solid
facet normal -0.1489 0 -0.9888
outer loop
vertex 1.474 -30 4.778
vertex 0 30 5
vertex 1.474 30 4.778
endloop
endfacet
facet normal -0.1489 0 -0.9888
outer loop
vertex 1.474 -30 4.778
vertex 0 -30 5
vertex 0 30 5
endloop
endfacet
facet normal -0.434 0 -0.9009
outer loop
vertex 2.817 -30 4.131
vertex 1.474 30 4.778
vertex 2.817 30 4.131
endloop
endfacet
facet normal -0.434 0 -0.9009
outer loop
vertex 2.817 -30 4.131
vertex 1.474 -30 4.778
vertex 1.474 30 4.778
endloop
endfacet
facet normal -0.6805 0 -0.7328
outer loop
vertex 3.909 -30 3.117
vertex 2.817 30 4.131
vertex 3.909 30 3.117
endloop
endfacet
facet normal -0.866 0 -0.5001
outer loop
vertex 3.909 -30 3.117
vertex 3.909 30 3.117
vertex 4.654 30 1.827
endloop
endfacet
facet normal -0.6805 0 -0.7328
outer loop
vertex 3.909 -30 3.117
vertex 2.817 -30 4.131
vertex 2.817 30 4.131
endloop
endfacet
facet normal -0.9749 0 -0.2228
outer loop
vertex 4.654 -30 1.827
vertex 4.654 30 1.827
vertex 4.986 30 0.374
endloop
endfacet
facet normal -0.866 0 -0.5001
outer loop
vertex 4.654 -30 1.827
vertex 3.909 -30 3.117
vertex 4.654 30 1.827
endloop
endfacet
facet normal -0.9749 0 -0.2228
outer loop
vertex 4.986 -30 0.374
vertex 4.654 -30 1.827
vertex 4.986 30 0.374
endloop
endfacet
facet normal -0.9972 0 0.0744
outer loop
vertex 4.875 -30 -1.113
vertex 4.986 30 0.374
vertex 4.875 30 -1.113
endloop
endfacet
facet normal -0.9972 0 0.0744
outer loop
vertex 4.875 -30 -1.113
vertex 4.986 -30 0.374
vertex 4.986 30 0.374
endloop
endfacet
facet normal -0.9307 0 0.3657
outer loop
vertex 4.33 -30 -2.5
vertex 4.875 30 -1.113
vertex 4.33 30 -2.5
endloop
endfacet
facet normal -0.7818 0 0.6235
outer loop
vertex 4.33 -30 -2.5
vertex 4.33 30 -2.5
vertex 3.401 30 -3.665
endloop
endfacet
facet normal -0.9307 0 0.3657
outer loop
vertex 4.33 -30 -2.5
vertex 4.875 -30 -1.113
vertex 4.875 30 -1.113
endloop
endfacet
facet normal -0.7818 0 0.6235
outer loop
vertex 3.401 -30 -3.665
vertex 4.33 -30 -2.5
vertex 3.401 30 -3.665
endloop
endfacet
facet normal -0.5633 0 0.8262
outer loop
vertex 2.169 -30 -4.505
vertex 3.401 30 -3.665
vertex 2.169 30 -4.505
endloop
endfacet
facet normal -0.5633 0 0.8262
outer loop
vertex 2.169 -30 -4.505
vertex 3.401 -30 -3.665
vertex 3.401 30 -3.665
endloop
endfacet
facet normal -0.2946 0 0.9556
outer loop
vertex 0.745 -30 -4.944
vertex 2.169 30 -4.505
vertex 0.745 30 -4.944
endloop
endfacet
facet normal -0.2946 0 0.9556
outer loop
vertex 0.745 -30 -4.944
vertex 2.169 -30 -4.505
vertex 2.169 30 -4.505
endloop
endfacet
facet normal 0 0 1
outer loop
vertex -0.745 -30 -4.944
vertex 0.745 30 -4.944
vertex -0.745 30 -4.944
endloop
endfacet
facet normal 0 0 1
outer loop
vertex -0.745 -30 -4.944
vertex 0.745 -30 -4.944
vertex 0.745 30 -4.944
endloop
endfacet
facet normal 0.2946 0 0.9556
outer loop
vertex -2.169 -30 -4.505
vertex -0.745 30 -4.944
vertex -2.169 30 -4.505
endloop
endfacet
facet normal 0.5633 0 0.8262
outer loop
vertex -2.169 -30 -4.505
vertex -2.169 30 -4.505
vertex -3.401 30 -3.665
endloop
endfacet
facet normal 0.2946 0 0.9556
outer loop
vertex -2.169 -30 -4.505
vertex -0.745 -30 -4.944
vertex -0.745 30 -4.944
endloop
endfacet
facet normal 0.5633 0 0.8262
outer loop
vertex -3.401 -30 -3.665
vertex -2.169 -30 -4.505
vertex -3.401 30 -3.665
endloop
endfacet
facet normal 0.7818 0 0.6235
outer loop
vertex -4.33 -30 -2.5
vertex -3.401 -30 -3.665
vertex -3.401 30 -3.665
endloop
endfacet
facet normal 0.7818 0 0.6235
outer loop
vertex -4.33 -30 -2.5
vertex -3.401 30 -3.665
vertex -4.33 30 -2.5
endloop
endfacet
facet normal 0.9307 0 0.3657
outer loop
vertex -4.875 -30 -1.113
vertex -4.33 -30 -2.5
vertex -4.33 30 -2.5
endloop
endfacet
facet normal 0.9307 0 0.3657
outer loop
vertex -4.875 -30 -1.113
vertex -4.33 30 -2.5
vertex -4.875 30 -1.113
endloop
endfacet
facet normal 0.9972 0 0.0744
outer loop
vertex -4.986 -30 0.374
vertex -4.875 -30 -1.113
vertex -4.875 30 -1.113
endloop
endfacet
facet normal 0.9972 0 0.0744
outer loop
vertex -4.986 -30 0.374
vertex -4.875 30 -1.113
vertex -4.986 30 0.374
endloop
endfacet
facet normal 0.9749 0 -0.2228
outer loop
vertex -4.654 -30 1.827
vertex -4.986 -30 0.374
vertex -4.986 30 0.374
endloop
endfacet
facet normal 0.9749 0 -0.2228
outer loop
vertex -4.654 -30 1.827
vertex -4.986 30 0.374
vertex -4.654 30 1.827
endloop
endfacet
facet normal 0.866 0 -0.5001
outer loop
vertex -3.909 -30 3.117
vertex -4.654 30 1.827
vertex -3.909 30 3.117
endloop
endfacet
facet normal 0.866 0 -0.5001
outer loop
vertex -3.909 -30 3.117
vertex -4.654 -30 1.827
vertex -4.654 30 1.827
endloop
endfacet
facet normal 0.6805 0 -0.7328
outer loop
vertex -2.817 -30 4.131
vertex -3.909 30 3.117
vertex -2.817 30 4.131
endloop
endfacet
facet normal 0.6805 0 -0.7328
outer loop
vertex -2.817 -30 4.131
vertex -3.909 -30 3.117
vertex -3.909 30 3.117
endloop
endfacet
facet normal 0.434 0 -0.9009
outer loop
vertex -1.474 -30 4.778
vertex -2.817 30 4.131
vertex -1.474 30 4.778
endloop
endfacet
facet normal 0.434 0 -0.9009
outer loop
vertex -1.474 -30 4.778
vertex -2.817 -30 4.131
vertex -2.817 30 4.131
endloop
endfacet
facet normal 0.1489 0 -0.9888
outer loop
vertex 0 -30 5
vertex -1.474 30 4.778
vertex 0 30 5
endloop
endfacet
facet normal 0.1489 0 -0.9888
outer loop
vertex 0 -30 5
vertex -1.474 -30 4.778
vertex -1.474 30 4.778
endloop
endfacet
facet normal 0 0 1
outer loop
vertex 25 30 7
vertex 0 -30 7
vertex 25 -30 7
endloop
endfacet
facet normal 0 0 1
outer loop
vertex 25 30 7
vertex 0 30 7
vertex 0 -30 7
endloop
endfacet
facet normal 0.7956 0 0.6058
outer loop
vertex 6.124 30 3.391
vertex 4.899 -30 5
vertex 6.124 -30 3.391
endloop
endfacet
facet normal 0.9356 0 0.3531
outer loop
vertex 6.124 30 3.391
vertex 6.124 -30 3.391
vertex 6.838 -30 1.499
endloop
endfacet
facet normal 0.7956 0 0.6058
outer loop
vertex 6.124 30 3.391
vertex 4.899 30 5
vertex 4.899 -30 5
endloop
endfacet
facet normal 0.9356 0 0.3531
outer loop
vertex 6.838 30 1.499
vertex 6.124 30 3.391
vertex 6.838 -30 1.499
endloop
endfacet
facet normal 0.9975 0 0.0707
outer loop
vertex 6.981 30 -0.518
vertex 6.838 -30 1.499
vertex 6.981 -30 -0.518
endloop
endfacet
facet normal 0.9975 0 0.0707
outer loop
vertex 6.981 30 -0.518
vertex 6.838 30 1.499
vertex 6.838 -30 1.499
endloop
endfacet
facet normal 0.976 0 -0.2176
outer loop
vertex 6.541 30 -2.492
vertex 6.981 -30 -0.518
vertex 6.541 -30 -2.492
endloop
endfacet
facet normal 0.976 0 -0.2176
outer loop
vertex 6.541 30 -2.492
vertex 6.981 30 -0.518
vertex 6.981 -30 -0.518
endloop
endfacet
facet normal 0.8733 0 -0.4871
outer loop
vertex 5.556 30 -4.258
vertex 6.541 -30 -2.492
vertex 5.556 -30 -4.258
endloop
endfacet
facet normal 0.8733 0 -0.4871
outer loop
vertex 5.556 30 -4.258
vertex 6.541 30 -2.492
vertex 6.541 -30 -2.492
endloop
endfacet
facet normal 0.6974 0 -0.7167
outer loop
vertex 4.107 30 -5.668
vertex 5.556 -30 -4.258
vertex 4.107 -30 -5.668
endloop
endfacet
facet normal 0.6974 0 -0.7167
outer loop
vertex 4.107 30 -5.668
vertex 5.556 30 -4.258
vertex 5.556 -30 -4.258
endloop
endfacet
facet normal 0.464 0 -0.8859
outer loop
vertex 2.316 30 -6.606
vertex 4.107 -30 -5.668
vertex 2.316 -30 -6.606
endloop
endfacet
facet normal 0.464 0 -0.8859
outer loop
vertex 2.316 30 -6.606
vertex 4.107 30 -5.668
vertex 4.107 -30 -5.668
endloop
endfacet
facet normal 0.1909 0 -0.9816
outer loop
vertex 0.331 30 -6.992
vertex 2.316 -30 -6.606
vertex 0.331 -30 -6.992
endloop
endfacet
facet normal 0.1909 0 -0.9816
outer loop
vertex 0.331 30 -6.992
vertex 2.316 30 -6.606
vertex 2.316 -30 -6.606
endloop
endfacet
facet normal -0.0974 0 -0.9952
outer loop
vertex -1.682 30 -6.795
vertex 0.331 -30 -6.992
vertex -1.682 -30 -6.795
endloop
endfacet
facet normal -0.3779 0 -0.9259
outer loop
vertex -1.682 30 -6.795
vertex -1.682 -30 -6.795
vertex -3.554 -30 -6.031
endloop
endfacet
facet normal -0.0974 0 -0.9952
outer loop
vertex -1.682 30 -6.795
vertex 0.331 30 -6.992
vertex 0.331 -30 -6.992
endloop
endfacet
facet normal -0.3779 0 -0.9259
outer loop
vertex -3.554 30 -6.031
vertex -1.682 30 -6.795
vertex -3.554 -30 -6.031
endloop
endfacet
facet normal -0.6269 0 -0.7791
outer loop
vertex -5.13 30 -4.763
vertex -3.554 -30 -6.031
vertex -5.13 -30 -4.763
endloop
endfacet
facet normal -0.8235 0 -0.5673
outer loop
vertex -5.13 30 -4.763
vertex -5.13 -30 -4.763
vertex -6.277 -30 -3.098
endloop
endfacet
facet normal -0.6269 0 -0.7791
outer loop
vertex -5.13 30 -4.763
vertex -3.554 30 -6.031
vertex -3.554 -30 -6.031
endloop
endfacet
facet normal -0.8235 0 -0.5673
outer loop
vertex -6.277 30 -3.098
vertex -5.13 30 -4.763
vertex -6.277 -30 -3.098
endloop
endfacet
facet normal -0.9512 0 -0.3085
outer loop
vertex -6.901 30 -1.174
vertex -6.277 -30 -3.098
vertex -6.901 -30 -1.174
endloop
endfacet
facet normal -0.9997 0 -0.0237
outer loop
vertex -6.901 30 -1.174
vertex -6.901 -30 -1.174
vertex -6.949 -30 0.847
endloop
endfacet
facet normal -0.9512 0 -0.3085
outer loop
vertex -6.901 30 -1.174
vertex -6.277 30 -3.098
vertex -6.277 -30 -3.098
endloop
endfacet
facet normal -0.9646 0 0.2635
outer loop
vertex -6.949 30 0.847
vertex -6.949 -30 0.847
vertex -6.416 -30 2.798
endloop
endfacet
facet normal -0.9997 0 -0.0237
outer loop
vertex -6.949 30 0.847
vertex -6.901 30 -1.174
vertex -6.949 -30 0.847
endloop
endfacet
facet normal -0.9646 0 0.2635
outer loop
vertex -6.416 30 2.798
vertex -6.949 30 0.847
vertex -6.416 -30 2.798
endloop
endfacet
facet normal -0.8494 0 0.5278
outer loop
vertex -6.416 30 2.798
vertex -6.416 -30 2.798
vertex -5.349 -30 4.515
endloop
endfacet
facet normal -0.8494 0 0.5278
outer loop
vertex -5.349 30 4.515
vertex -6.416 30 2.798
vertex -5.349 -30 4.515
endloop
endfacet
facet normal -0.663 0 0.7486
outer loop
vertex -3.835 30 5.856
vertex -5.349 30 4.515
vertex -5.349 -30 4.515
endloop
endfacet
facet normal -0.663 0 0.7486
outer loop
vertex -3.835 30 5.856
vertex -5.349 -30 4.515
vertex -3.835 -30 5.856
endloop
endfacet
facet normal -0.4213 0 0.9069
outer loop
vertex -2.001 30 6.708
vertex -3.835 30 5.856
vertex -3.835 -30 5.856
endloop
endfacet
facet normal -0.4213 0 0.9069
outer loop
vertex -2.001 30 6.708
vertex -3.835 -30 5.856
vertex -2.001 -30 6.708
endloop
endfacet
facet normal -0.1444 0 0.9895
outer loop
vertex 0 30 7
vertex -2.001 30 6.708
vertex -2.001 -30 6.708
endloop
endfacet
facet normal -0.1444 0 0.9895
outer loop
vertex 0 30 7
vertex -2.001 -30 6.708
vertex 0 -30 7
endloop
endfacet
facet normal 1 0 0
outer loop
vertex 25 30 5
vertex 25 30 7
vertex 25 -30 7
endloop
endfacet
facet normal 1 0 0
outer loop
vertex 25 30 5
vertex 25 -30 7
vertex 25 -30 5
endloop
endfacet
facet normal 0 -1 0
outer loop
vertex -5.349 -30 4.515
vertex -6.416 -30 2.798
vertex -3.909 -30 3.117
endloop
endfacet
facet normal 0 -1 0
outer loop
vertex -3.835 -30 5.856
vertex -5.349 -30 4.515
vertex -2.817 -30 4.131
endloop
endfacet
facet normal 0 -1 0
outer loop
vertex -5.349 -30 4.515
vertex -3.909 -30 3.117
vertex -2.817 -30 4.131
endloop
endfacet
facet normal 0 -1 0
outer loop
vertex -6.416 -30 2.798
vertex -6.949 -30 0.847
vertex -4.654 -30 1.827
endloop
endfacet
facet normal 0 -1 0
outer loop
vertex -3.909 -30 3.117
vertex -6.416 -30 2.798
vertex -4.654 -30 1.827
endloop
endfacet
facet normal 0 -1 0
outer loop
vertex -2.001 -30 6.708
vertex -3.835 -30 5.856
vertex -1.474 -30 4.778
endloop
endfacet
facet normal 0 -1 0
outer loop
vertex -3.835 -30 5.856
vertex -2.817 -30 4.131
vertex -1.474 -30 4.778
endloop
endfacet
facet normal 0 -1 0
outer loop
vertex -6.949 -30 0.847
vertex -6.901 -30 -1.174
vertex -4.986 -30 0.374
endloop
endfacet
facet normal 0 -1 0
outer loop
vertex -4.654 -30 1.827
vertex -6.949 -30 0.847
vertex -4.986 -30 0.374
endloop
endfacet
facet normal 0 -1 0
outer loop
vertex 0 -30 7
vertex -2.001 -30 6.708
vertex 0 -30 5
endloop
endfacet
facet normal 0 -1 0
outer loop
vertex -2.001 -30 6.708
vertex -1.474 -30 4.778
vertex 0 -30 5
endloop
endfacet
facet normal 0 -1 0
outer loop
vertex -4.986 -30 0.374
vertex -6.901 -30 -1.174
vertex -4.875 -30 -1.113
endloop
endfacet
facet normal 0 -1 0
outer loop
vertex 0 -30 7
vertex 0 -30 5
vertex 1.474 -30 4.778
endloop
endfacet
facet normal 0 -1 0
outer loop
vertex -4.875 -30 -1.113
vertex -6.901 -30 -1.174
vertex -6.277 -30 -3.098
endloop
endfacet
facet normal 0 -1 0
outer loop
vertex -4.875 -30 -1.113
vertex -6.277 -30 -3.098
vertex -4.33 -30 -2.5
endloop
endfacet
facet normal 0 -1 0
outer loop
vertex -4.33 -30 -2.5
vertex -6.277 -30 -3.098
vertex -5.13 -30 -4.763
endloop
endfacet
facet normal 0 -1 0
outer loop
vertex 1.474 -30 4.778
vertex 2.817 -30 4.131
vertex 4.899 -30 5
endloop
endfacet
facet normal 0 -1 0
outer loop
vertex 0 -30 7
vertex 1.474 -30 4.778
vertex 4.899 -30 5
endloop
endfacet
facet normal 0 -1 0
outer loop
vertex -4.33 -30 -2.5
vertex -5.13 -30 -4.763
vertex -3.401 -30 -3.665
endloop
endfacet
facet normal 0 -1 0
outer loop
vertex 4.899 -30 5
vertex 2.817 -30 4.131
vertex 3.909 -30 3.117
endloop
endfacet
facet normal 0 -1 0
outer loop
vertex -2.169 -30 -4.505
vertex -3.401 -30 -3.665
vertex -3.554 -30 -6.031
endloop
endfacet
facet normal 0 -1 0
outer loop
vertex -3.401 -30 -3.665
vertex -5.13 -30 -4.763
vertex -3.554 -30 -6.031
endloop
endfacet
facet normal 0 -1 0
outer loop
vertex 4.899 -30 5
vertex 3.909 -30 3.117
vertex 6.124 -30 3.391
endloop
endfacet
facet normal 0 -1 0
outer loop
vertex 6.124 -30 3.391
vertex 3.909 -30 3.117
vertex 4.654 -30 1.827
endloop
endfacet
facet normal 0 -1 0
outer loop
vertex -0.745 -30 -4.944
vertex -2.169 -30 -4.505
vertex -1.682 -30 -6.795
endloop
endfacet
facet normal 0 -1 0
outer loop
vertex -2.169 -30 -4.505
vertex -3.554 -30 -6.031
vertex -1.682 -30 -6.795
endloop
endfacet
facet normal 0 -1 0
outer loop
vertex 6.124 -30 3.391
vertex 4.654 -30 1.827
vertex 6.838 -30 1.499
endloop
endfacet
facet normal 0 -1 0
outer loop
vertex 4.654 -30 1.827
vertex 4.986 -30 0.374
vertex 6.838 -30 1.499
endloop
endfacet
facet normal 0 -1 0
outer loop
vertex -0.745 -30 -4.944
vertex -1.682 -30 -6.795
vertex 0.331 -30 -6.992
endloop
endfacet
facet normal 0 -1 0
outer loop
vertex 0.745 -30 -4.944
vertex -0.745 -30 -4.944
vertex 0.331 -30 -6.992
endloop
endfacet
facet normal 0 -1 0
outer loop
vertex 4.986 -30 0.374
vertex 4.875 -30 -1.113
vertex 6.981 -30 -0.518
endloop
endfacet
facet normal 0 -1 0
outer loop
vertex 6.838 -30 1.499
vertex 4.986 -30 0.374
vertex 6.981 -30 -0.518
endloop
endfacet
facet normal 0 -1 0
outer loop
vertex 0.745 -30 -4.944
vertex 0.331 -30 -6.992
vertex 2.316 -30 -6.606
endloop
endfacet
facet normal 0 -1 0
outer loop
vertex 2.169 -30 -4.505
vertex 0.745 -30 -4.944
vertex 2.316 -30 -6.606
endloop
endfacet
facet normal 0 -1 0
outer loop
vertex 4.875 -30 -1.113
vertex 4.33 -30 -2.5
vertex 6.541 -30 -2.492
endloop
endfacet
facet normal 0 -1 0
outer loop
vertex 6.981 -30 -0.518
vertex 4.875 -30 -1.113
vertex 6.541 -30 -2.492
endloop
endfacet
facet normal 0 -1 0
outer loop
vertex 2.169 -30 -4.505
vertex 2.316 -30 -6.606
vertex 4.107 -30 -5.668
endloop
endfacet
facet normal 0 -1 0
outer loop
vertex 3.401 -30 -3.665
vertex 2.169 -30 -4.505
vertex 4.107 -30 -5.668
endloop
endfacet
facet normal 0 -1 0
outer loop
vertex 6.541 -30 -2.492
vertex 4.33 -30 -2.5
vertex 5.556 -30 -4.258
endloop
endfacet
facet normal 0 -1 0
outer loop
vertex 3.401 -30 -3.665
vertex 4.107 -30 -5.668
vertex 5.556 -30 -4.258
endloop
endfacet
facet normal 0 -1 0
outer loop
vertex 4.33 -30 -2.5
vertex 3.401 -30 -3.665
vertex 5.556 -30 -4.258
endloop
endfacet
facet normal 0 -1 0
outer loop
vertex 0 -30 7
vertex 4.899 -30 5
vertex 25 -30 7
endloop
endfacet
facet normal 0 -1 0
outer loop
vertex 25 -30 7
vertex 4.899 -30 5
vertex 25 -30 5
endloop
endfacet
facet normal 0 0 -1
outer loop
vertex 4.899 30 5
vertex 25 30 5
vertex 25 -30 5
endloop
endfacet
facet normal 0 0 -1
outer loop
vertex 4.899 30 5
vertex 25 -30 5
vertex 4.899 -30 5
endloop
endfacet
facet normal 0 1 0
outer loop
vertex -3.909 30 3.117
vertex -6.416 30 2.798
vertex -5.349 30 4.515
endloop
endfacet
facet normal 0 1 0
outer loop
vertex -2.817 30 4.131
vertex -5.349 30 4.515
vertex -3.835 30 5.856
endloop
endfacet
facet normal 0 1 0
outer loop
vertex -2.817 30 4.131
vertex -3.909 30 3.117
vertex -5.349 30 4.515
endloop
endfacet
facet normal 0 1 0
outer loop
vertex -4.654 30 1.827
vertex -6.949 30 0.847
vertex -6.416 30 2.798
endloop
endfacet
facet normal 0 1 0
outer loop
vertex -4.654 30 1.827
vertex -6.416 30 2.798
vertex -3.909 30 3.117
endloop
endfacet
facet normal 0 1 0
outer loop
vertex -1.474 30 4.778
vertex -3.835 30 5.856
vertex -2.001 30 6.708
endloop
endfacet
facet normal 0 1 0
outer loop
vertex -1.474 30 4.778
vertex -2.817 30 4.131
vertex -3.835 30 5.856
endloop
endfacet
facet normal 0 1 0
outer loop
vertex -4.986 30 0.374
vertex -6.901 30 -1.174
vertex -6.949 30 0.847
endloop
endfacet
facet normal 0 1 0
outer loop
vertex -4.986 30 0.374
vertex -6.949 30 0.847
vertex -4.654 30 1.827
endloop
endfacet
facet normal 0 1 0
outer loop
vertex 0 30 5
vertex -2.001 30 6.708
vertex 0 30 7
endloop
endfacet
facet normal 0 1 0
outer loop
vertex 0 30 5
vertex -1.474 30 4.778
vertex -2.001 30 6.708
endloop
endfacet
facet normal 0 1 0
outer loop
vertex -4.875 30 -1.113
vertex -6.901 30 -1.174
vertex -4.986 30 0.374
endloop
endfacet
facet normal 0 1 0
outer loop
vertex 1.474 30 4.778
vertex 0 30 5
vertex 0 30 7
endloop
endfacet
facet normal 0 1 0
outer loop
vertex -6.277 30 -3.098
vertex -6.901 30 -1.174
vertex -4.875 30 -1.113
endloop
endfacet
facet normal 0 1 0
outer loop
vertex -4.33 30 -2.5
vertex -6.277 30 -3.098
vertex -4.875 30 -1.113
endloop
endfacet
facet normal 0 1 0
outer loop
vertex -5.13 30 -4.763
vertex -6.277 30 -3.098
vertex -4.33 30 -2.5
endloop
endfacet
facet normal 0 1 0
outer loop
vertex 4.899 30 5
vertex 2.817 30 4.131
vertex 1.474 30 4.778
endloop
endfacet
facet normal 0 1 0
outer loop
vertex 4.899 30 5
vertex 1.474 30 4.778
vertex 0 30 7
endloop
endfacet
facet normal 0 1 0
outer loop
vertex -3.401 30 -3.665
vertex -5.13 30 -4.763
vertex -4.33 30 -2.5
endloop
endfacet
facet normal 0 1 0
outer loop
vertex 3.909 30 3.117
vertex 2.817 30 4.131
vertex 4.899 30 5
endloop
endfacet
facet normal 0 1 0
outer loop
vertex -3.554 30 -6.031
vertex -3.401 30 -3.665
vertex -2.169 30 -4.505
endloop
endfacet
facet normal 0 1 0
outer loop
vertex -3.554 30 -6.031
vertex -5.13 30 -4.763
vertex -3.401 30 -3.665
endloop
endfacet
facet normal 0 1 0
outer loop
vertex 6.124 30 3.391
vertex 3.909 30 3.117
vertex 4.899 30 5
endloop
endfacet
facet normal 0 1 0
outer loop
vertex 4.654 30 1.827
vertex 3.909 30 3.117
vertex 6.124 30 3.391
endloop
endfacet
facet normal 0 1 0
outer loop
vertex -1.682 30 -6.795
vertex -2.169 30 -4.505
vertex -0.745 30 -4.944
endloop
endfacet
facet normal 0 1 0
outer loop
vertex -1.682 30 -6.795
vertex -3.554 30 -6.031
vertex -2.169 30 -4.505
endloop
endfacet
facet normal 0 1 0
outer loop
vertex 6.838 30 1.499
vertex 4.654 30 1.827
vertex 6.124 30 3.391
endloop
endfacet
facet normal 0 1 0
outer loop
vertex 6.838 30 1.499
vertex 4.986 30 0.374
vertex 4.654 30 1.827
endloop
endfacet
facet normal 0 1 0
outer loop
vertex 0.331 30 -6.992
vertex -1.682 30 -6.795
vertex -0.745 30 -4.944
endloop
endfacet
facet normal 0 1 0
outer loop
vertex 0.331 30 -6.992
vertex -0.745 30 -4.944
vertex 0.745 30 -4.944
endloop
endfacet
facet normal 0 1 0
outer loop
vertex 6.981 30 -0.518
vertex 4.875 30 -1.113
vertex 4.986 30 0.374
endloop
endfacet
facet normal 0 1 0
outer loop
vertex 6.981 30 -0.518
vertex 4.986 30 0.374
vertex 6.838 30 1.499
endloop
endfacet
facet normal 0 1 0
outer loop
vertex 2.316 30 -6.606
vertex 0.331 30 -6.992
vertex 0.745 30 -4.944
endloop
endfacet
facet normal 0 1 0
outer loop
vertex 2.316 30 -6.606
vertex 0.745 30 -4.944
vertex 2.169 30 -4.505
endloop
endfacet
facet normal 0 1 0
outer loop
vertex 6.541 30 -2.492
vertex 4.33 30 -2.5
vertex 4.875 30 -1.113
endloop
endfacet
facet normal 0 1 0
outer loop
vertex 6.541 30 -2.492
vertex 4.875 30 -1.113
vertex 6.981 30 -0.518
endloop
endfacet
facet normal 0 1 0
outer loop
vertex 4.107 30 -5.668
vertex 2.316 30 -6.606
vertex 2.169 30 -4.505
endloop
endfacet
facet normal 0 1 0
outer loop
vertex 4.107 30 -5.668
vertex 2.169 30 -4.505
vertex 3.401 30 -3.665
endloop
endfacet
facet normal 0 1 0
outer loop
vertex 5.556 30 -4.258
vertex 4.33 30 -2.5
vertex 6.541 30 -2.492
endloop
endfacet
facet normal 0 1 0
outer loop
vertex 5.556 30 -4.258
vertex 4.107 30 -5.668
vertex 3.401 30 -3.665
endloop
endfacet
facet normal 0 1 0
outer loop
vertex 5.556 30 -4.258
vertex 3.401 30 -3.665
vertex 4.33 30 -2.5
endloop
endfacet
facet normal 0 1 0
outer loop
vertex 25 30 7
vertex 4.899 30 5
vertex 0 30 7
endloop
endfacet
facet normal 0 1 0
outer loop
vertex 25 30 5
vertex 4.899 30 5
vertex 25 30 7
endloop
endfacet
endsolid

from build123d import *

# Parameters (mm, degrees)
SKETCH1_R           = 5
BOSS_EXTRUDE1_DEPTH = 30


with BuildPart() as part:
    # Sketch1 → Boss-Extrude1 (new, symmetric)
    with BuildSketch(Plane(origin=(0, 0, 0), x_dir=(1, 0, 0), z_dir=(0, 1, 0))):
        with BuildLine():
            Line((0, -7), (25, -7))
            Line((25, -7), (25, -5))
            Line((25, -5), (4.898979486, -5))
            ThreePointArc((4.898979486, -5), (-2.645751311, 6.480740698), (0, -7))
        make_face()
        with Locations(Location((0, 0, 0), (0, 0, 270))):
            Circle(SKETCH1_R, mode=Mode.SUBTRACT)
    extrude(amount=BOSS_EXTRUDE1_DEPTH, both=True)


solid = part.part
